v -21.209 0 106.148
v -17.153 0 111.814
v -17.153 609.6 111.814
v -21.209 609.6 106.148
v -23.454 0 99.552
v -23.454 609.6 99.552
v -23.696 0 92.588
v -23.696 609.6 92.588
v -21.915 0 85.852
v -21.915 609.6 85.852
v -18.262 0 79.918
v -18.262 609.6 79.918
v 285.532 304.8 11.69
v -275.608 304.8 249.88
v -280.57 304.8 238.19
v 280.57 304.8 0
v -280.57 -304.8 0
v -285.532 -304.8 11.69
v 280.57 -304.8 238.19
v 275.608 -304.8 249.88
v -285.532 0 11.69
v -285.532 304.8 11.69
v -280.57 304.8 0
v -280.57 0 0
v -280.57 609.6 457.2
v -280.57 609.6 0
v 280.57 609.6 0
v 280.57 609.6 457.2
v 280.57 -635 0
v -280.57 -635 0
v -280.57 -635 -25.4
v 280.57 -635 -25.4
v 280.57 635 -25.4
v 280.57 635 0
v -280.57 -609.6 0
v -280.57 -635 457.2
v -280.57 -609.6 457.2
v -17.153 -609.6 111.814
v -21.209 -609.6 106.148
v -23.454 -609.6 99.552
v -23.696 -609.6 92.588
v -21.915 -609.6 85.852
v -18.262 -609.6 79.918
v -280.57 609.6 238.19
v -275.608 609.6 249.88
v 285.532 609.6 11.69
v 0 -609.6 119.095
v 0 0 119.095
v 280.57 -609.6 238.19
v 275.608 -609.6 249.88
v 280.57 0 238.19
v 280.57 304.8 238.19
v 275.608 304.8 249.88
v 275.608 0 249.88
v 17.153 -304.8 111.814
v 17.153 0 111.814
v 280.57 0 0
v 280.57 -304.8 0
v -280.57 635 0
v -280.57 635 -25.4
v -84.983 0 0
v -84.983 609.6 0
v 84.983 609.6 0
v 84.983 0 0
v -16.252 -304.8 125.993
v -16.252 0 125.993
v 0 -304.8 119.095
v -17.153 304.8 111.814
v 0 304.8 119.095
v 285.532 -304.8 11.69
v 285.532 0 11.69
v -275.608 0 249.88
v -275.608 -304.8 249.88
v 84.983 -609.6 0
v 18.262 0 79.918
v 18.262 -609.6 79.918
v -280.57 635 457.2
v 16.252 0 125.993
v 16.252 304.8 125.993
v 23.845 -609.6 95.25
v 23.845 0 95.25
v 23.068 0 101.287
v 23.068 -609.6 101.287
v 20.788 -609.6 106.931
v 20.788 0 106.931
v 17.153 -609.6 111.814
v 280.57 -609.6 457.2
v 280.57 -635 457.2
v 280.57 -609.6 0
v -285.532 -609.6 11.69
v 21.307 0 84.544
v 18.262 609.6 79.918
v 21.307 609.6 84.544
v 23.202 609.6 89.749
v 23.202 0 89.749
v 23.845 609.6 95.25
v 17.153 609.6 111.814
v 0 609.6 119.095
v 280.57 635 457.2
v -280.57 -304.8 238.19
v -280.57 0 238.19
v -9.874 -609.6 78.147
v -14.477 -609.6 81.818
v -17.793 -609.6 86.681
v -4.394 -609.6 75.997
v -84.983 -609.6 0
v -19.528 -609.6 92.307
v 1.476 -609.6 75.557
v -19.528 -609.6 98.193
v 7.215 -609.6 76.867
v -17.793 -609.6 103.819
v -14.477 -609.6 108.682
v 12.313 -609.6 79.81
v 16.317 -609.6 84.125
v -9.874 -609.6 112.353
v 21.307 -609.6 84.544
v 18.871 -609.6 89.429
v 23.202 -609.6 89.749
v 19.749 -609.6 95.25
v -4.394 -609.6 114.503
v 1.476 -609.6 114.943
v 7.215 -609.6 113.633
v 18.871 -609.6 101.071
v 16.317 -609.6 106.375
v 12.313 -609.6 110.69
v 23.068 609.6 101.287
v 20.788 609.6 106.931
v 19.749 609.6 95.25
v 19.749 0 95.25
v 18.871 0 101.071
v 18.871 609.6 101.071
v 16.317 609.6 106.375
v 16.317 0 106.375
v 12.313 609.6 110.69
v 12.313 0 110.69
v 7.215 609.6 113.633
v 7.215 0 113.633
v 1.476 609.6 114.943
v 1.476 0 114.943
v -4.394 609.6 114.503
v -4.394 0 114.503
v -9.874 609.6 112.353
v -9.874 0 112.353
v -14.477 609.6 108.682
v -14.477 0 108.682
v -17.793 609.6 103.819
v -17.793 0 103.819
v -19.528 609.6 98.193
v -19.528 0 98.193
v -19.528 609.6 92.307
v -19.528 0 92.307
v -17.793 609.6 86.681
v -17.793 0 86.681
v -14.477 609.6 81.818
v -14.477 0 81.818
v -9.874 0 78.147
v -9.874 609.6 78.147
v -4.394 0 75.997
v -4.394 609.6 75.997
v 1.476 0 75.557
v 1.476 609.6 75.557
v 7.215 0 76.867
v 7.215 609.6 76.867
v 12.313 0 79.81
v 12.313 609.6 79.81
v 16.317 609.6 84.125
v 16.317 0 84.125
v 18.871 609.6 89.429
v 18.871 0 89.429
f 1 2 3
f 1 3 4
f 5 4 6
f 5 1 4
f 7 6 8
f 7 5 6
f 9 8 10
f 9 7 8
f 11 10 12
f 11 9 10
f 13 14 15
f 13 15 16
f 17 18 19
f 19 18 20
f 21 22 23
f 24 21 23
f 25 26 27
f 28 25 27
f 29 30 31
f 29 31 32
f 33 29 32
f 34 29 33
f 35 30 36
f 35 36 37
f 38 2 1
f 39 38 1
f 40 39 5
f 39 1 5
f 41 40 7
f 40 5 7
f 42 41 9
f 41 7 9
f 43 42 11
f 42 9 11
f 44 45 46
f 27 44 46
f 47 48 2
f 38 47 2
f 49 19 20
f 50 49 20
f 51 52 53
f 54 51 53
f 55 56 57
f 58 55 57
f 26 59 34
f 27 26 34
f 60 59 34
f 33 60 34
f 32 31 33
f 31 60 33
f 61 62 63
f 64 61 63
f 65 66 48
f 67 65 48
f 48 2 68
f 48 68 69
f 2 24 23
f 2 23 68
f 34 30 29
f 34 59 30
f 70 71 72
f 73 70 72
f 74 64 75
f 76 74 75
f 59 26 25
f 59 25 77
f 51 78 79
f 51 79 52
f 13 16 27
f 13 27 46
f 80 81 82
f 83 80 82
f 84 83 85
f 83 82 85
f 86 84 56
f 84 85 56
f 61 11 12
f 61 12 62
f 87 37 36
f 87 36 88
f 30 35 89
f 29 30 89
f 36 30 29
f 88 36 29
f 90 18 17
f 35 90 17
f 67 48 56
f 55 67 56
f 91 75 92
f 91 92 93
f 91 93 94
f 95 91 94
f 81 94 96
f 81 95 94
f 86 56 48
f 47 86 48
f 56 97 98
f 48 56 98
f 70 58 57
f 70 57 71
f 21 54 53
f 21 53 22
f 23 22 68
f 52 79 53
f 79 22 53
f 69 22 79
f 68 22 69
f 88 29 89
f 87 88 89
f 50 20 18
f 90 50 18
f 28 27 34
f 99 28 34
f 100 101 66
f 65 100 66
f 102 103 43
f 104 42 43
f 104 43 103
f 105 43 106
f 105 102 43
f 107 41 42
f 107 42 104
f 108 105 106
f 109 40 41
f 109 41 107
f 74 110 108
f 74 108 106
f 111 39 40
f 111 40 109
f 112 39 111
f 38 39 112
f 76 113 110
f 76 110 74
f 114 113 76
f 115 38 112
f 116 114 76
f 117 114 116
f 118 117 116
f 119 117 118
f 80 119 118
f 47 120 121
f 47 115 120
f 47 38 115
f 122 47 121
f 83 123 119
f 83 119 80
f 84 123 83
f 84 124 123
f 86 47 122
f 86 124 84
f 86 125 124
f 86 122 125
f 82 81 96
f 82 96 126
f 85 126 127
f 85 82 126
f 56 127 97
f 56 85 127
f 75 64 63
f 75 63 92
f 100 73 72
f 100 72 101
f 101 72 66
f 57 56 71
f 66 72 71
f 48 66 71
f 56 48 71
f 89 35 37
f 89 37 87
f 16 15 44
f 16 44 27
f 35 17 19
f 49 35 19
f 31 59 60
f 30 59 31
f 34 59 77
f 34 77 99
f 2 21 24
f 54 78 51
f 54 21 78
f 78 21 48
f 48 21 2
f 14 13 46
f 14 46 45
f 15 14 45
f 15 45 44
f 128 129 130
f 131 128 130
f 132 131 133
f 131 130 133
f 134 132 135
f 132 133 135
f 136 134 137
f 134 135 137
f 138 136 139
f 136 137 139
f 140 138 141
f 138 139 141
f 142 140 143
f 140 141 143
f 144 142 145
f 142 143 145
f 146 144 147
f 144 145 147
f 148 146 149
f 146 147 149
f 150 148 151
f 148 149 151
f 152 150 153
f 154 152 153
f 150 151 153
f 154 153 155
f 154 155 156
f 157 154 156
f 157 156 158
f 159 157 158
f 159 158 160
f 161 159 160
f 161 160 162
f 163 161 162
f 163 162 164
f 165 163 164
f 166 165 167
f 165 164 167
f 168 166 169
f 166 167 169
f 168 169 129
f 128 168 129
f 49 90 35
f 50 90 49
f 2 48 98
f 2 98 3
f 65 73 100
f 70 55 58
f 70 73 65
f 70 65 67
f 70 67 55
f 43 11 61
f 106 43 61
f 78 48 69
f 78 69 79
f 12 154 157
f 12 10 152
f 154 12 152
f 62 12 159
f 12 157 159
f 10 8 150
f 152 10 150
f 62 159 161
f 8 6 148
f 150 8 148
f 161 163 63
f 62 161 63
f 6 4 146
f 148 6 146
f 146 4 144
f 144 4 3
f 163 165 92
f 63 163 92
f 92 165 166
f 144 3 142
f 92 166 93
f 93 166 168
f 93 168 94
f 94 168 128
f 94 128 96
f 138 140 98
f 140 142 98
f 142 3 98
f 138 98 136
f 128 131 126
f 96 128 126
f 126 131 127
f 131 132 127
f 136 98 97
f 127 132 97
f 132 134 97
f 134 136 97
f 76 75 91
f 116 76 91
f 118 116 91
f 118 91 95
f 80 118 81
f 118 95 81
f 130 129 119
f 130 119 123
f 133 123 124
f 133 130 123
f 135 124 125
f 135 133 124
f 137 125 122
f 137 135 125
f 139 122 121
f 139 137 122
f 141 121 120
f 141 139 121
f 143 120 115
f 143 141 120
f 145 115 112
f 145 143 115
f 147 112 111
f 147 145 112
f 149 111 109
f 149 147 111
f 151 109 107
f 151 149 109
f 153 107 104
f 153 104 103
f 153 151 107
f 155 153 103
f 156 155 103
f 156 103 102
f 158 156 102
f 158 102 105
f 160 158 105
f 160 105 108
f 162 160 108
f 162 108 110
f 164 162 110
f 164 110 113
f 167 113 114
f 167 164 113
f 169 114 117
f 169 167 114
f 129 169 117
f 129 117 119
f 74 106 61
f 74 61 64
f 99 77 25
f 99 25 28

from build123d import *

# Parameters (mm, degrees)
F2_DEPTH      = 304.8
F3_START      = -609.6
F3_DEPTH      = 304.8
F4_DEPTH      = 304.8
F5_START      = 304.8
F5_DEPTH      = 304.8
F1_R          = 19.7485849545
F6_DEPTH      = 609.6
F6_DEPTH_BACK = 609.6
F0_W          = 561.1397464
F0_H          = 25.4
F7_DEPTH      = 457.2
F0_H_2        = 1219.2
F8_DEPTH      = 25.4


with BuildPart() as f2:
    # F1 (on Front) → F2 (new body)
    with BuildSketch(Plane.XZ):
        Polygon((-280.5698793323, 238.1896959271), (-16.2515846243, 125.9932363601), (0, 132.8916247566), (-275.6075940005, 249.8801075659), align=None)
        with BuildLine():
            Line((16.2515846243, 125.9932363601), (0, 119.0948479635))
            ThreePointArc((0, 119.0948479635), (9.3169243534, 117.1992982803), (17.1525481732, 111.8140232302))
            Line((17.1525481732, 111.8140232302), (280.5698793323, 0))
            Line((280.5698793323, 0), (285.5321646641, 11.6904116388))
            Line((285.5321646641, 11.6904116388), (16.2515846243, 125.9932363601))
        make_face()
        Polygon((-16.2515846243, 125.9932363601), (0, 119.0948479635), (16.2515846243, 125.9932363601), (0, 132.8916247566), align=None)
        with BuildLine():
            ThreePointArc((17.1525481732, 111.8140232302), (9.3169243534, 117.1992982803), (0, 119.0948479635))
            Line((0, 119.0948479635), (17.1525481732, 111.8140232302))
        make_face()
    extrude(amount=F2_DEPTH)


with BuildPart() as f3:
    # F2_face (on face) → F3 (new body)
    with BuildSketch(Plane(origin=(2.4811426659, -304.8, 124.940053783), x_dir=(1, 0, 0), z_dir=(0, -1, 0)).offset(F3_START)):
        Polygon((-278.0887366664, 124.940053783), (-283.0510219982, 113.2496421441), (278.0887366664, -124.940053783), (283.0510219982, -113.2496421441), align=None)
    extrude(amount=-F3_DEPTH)


with BuildPart() as f4:
    # F1 (on Front) → F4 (new body)
    with BuildSketch(Plane.XZ):
        Polygon((0, 132.8916247566), (16.2515846243, 125.9932363601), (280.5698793323, 238.1896959271), (275.6075940005, 249.8801075659), align=None)
        Polygon((-16.2515846243, 125.9932363601), (0, 119.0948479635), (16.2515846243, 125.9932363601), (0, 132.8916247566), align=None)
        with BuildLine():
            Line((-17.1525481732, 111.8140232302), (0, 119.0948479635))
            ThreePointArc((0, 119.0948479635), (-9.3169243534, 117.1992982803), (-17.1525481732, 111.8140232302))
        make_face()
        with BuildLine():
            ThreePointArc((-17.1525481732, 111.8140232302), (-9.3169243534, 117.1992982803), (0, 119.0948479635))
            Line((0, 119.0948479635), (-16.2515846243, 125.9932363601))
            Line((-16.2515846243, 125.9932363601), (-285.5321646641, 11.6904116388))
            Line((-285.5321646641, 11.6904116388), (-280.5698793323, 0))
            Line((-280.5698793323, 0), (-17.1525481732, 111.8140232302))
        make_face()
    extrude(amount=-F4_DEPTH)


with BuildPart() as f5:
    # F4_face (on face) → F5 (new body)
    with BuildSketch(Plane(origin=(-2.4811426659, 0, 124.940053783), x_dir=(1, 0, 0), z_dir=(0, -1, 0)).offset(F5_START)):
        Polygon((283.0510219982, 113.2496421441), (278.0887366664, 124.940053783), (-283.0510219982, -113.2496421441), (-278.0887366664, -124.940053783), align=None)
    extrude(amount=F5_DEPTH)


with BuildPart() as f6:
    # F1 (on Front) → F6 (new body, two sides)
    with BuildSketch(Plane.XZ) as f6_sk:
        with BuildLine():
            Line((17.1525481732, 111.8140232302), (0, 119.0948479635))
            Line((0, 119.0948479635), (-17.1525481732, 111.8140232302))
            ThreePointArc((-17.1525481732, 111.8140232302), (-23.8304400681, 96.0787946457), (-18.2618665319, 79.9176484134))
            ThreePointArc((-18.2618665319, 79.9176484134), (0, 71.4051520365), (18.2618665319, 79.9176484134))
            ThreePointArc((18.2618665319, 79.9176484134), (22.4056712172, 87.0914050407), (23.8448479635, 95.25))
            ThreePointArc((23.8448479635, 95.25), (22.1085580464, 104.1824372661), (17.1525481732, 111.8140232302))
        make_face()
        with Locations((0, 95.25)):
            Circle(F1_R, mode=Mode.SUBTRACT)
        with BuildLine():
            ThreePointArc((18.2618665319, 79.9176484134), (0, 71.4051520365), (-18.2618665319, 79.9176484134))
            Line((-18.2618665319, 79.9176484134), (-84.9831551313, 0))
            Line((-84.9831551313, 0), (84.9831551313, 0))
            Line((84.9831551313, 0), (18.2618665319, 79.9176484134))
        make_face()
    extrude(amount=-F6_DEPTH)
    extrude(f6_sk.sketch, amount=F6_DEPTH_BACK)


with BuildPart() as f7:
    # F0 (on Top) → F7 (new body)
    with BuildSketch(Plane.XY):
        with Locations((0, 622.3)):
            Rectangle(F0_W, F0_H)
    extrude(amount=F7_DEPTH)


with BuildPart() as f7b:
    # F0 (on Top) → F7, piece 2 (new body)
    with BuildSketch(Plane.XY):
        with Locations((0, -622.3)):
            Rectangle(F0_W, F0_H)
    extrude(amount=F7_DEPTH)


with BuildPart() as f8:
    # F0 (on Top) → F8 (new body)
    with BuildSketch(Plane.XY):
        Rectangle(F0_W, F0_H_2)
        with Locations((0, -622.3)):
            Rectangle(F0_W, F0_H)
        with Locations((0, 622.3)):
            Rectangle(F0_W, F0_H)
    extrude(amount=-F8_DEPTH)


solid = Compound([f2.part, f3.part, f4.part, f5.part, f6.part, f7.part, f7b.part, f8.part])
